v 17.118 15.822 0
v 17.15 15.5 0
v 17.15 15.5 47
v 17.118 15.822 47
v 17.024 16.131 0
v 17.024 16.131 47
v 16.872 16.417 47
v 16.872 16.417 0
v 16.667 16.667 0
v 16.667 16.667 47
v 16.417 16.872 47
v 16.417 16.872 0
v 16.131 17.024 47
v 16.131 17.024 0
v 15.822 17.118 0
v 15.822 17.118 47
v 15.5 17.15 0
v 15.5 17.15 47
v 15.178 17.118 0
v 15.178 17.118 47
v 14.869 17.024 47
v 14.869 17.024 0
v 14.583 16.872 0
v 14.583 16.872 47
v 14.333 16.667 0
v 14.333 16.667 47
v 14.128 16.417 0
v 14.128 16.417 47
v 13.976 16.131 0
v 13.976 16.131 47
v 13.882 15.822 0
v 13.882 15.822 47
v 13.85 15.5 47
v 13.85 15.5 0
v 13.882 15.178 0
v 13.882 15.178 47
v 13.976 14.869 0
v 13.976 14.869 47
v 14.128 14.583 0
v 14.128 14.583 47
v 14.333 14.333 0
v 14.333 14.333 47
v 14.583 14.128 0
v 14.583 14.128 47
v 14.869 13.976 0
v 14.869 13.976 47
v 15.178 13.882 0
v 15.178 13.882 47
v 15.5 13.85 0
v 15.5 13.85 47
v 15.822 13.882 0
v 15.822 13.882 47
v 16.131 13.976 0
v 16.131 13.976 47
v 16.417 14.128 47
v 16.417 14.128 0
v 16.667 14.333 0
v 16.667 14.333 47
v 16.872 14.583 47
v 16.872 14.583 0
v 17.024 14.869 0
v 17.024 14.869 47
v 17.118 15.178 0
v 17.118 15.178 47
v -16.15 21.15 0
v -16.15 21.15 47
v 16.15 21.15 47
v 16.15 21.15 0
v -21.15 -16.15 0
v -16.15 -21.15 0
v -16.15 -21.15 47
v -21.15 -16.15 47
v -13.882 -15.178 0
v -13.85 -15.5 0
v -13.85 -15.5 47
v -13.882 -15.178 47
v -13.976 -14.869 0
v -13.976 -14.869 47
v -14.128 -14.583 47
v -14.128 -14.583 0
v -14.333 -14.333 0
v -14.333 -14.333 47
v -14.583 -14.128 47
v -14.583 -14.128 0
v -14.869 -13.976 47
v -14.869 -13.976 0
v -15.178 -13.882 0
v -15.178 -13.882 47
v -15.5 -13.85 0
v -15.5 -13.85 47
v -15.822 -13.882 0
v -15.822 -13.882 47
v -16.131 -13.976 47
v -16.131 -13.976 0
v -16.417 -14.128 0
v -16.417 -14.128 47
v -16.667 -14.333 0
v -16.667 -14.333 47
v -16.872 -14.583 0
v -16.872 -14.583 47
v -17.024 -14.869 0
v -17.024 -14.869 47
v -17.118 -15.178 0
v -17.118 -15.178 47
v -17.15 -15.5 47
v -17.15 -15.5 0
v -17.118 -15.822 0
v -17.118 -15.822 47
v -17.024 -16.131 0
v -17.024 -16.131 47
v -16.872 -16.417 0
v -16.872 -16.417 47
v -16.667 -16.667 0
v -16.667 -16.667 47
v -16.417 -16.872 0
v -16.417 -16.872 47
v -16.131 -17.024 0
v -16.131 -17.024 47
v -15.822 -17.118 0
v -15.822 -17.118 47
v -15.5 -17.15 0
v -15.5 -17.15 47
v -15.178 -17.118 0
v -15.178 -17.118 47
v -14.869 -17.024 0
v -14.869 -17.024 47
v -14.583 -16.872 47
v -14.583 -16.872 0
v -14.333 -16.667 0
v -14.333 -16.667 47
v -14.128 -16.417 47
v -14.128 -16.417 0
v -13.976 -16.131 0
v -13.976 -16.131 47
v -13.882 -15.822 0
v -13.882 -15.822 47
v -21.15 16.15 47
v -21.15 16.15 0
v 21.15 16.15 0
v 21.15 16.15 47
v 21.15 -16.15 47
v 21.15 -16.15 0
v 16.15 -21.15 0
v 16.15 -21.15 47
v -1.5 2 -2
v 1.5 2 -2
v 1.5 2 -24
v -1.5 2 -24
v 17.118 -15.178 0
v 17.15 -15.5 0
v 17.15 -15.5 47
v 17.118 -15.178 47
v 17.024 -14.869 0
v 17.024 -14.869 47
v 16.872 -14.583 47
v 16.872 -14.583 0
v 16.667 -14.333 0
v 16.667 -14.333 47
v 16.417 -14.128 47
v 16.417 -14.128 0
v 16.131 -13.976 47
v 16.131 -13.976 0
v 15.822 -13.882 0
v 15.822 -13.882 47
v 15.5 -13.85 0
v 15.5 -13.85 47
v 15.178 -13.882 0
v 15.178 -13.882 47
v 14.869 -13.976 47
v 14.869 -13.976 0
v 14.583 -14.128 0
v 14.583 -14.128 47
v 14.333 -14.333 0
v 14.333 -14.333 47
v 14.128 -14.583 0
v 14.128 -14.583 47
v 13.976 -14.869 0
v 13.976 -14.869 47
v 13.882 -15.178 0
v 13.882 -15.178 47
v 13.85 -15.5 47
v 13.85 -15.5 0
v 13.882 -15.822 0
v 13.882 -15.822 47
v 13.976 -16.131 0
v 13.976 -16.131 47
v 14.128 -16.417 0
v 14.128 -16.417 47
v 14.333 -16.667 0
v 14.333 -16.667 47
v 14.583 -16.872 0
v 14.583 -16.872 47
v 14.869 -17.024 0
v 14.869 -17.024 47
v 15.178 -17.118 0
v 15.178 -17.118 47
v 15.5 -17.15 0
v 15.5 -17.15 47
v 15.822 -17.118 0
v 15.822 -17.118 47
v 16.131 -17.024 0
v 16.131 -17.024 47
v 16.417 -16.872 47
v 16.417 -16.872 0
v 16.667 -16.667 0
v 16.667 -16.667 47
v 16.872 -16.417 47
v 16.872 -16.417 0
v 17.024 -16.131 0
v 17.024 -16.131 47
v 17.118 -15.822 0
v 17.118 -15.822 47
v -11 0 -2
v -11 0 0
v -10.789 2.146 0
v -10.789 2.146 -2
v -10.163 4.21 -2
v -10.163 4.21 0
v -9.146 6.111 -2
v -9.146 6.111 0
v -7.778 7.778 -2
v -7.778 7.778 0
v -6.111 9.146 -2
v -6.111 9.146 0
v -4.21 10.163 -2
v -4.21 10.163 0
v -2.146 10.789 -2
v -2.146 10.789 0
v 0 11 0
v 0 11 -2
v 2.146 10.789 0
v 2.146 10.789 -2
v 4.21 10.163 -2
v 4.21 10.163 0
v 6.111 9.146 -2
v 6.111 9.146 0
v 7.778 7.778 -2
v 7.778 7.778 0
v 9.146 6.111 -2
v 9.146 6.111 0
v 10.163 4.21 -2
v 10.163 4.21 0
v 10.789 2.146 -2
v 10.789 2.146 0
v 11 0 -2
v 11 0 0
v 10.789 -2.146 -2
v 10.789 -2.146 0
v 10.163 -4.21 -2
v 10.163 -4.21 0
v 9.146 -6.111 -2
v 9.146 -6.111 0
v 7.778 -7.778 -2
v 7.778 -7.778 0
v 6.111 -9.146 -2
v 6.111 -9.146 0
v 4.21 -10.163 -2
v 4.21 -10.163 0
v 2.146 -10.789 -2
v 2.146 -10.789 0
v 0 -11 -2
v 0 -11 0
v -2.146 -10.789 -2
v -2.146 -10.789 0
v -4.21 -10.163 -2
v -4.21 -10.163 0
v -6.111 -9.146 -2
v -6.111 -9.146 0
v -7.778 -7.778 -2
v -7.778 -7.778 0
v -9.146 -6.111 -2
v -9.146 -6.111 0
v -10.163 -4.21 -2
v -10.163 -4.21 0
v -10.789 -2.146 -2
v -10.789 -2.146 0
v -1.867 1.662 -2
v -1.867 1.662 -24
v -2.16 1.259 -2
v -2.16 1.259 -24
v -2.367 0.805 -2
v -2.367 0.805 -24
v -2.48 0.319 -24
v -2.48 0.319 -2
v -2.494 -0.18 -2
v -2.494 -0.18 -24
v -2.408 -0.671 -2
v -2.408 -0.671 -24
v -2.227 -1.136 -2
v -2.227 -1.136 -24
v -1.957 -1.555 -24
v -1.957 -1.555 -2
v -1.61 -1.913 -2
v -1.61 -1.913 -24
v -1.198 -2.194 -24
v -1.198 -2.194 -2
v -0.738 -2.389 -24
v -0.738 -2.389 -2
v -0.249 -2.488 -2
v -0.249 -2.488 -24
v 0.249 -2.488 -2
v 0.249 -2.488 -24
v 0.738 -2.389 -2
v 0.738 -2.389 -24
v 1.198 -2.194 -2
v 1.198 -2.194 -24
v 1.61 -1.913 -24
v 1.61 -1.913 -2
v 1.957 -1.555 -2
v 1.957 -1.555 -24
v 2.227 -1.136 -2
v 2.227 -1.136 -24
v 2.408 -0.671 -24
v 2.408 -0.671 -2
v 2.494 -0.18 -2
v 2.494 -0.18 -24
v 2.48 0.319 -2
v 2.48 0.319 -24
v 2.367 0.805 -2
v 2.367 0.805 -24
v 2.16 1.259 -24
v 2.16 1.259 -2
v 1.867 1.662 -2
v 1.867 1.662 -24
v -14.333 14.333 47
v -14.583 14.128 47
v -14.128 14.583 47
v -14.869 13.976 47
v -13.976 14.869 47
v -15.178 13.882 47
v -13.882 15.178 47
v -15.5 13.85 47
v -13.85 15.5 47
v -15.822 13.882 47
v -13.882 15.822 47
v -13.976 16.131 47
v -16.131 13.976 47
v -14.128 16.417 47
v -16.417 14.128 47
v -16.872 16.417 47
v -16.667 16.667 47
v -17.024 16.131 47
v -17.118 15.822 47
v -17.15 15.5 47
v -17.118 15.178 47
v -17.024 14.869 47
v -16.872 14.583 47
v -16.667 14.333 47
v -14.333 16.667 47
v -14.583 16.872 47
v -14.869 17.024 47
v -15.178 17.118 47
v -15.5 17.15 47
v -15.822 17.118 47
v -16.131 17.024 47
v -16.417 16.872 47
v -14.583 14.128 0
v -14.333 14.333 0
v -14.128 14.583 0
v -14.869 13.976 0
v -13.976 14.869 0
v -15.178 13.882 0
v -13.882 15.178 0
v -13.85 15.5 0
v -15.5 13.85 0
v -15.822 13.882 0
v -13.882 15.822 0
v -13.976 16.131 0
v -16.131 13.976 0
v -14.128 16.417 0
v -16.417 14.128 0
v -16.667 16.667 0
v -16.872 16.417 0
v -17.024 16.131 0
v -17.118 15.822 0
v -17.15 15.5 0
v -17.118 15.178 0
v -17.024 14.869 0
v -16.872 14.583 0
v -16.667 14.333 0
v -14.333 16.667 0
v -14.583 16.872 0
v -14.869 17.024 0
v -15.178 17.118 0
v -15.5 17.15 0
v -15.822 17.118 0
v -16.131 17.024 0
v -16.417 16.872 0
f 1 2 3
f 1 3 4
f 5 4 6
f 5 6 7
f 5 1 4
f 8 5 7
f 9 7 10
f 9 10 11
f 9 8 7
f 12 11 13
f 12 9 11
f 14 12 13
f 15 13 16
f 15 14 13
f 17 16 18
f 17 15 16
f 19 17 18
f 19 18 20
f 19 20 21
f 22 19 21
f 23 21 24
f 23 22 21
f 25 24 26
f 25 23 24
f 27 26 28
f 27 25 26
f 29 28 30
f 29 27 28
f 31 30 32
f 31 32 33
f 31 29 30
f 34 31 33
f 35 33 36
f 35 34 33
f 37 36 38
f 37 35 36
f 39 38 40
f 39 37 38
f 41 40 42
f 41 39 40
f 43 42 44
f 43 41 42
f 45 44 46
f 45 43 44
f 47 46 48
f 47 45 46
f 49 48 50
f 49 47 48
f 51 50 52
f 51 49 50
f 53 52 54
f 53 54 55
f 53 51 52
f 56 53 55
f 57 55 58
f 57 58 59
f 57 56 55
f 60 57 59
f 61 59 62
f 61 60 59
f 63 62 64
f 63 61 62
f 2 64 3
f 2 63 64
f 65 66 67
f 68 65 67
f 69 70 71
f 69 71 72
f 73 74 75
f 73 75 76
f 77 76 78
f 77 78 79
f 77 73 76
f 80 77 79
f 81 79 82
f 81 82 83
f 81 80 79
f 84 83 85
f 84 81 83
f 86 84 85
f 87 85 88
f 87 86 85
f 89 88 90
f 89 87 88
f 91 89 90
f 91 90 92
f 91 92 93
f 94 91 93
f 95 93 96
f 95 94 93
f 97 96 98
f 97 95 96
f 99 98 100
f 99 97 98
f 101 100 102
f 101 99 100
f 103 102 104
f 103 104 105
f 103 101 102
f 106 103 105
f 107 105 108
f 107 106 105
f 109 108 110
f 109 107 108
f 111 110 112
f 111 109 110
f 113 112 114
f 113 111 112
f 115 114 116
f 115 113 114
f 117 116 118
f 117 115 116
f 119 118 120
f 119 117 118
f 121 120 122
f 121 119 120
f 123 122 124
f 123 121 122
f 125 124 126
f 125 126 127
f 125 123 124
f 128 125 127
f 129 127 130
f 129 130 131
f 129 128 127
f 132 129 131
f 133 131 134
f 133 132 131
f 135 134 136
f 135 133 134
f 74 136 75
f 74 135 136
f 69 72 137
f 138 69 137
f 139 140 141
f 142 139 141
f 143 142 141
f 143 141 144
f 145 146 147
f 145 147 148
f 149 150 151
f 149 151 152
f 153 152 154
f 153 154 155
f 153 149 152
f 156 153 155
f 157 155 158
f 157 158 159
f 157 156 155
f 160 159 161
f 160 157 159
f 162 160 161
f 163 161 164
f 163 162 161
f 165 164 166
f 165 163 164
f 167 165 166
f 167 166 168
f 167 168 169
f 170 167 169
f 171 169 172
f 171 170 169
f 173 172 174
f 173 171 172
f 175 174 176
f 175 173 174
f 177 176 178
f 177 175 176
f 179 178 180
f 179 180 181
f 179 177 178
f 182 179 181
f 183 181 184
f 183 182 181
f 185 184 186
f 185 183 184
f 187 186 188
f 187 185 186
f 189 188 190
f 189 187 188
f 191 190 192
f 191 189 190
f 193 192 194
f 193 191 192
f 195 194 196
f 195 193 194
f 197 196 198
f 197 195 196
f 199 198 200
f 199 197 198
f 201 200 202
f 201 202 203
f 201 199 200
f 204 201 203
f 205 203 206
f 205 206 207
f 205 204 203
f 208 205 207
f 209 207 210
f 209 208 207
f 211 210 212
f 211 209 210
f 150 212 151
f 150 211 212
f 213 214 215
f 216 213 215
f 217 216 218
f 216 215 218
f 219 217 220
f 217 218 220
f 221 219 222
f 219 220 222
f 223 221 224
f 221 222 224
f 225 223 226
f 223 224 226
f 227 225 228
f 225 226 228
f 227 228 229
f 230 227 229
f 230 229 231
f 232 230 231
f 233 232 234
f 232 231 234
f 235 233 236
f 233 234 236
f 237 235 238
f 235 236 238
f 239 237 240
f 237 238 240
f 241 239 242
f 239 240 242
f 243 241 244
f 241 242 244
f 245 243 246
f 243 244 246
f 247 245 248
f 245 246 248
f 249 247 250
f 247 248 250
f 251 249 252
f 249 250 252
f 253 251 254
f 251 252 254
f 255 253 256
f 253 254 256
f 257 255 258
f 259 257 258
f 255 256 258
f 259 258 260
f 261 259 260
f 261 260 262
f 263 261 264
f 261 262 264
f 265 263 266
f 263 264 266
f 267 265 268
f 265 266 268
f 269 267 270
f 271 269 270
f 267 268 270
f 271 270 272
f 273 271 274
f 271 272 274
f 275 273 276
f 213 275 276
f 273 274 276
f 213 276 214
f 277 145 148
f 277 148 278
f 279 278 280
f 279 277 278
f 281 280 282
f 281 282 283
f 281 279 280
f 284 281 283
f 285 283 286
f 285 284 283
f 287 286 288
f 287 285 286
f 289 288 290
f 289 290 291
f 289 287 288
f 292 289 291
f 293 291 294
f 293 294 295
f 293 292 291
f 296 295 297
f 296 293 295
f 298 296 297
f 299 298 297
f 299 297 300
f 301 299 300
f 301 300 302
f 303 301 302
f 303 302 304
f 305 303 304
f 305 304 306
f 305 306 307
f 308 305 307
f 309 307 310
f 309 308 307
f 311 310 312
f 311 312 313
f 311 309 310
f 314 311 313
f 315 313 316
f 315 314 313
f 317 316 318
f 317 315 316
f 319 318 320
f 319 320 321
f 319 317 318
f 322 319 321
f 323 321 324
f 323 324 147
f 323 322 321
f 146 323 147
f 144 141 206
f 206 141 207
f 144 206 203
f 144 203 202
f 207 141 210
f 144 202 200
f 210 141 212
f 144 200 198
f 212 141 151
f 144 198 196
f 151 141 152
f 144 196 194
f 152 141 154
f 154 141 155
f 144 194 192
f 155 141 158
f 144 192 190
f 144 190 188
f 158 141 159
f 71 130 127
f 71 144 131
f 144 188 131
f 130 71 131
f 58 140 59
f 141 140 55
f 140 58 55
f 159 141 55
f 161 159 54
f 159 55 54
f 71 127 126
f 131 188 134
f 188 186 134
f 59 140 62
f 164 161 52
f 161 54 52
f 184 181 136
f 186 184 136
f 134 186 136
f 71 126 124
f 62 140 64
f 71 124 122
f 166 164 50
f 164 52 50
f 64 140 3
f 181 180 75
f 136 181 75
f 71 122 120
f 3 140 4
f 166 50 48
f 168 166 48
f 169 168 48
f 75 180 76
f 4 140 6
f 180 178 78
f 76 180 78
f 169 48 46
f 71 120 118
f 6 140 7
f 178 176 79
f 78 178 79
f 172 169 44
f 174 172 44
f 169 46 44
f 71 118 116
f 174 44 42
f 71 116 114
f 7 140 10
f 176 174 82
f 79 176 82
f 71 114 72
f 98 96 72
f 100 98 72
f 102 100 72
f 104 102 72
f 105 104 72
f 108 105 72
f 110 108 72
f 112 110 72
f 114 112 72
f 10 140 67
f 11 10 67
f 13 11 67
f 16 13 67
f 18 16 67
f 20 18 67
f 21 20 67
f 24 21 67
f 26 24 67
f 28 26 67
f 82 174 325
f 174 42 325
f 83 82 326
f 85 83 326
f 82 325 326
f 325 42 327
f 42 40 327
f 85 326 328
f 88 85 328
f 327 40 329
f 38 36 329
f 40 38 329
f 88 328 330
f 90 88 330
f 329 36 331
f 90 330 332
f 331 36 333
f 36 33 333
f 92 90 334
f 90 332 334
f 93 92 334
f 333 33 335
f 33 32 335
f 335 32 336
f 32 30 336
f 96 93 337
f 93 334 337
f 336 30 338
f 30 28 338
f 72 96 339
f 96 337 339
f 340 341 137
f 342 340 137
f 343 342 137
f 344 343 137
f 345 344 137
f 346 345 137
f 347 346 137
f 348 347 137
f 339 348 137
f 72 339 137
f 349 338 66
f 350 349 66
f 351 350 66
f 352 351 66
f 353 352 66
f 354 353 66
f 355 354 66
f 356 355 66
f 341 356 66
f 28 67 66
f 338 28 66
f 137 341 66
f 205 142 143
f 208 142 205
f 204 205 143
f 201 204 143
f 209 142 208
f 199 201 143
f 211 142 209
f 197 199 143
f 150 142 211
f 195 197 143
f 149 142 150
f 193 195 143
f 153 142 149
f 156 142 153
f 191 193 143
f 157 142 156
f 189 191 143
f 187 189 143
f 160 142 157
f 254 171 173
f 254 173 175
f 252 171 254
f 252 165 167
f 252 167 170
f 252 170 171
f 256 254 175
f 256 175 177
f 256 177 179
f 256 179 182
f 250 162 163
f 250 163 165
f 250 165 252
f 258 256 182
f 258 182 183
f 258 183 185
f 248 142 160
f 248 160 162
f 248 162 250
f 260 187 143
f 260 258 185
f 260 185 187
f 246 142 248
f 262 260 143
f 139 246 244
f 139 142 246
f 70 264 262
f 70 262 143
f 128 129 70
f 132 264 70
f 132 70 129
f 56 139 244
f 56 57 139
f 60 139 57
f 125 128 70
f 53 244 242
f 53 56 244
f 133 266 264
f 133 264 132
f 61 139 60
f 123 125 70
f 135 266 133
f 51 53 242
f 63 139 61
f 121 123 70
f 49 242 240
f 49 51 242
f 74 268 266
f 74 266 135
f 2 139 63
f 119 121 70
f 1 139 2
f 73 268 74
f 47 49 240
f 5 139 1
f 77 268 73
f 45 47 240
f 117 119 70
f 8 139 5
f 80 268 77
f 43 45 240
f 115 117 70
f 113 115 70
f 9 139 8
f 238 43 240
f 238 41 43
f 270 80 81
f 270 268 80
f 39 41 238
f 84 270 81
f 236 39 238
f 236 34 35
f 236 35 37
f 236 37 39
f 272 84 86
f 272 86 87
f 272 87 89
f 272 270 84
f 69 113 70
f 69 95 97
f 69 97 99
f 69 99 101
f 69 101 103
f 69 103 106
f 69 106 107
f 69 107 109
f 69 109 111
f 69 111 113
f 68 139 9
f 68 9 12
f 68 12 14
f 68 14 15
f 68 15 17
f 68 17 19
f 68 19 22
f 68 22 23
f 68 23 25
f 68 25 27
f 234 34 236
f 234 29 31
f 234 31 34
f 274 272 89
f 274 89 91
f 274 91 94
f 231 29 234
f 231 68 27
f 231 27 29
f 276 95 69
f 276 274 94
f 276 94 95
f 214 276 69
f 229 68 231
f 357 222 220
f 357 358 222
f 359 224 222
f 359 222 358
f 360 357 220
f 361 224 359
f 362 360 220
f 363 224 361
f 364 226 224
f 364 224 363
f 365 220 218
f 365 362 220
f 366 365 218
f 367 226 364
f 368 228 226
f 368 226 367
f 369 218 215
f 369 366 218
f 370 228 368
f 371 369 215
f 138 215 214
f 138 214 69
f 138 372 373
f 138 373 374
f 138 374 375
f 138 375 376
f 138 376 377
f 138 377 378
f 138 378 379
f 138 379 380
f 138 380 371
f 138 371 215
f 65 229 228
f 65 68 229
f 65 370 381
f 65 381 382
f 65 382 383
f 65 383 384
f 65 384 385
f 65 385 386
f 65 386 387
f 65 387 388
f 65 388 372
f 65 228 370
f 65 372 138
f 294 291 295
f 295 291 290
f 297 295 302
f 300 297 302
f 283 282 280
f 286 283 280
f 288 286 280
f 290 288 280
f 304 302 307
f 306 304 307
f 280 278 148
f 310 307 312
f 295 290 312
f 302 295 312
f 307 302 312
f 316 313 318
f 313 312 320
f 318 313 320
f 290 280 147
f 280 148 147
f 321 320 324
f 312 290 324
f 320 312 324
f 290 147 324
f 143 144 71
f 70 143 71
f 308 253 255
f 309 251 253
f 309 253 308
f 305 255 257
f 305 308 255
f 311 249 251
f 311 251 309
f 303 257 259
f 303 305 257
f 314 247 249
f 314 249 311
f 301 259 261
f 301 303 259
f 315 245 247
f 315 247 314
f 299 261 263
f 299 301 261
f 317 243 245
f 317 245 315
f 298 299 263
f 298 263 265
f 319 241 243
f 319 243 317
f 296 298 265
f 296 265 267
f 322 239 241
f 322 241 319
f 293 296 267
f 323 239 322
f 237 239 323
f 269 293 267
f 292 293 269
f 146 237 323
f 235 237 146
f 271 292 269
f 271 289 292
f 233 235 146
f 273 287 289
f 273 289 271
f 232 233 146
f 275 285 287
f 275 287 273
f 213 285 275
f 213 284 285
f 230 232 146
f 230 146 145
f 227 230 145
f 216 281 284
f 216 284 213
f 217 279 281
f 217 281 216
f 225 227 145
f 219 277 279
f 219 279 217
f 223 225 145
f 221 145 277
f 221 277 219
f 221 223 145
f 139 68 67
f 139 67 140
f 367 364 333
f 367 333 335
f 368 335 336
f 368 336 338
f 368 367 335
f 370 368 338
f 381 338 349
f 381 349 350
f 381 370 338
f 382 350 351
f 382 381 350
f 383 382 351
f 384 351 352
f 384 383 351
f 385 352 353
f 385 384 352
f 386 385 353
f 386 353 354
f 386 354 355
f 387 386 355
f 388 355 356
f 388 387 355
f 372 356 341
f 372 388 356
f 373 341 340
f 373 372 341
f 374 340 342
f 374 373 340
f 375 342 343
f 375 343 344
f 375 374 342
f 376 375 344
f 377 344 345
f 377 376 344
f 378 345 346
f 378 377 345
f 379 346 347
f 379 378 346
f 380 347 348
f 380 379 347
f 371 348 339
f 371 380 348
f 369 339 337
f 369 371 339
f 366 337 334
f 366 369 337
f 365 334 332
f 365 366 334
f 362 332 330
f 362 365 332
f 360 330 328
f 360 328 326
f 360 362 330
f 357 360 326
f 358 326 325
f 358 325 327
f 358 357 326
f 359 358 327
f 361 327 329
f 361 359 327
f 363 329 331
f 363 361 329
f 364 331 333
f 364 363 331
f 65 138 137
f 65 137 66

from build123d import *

# Parameters (mm, degrees)
SKETCH_1_R      = 1.65
EXTRUDE_1_DEPTH = 47
SKETCH_3_R      = 11
EXTRUDE_2_DEPTH = 2
EXTRUDE_3_DEPTH = 22


with BuildPart() as part:
    # 草图1 → 凸台-拉伸1 (new body)
    with BuildSketch(Plane.XY):
        Polygon((-21.15, 16.15), (-16.15, 21.15), (16.15, 21.15), (21.15, 16.15), (21.15, -16.15), (16.15, -21.15), (-16.15, -21.15), (-21.15, -16.15), align=None)
        with Locations((15.5, 15.5)):
            Circle(SKETCH_1_R, mode=Mode.SUBTRACT)
        with Locations((-15.5, 15.5)):
            Circle(SKETCH_1_R, mode=Mode.SUBTRACT)
        with Locations((15.5, -15.5)):
            Circle(SKETCH_1_R, mode=Mode.SUBTRACT)
        with Locations((-15.5, -15.5)):
            Circle(SKETCH_1_R, mode=Mode.SUBTRACT)
    extrude(amount=EXTRUDE_1_DEPTH)

    # 草图3 → 凸台-拉伸2 (add)
    with BuildSketch(Plane(origin=(0, 0, 0), x_dir=(-1, 0, 0), z_dir=(0, 0, -1))):
        Circle(SKETCH_3_R)
    extrude(amount=EXTRUDE_2_DEPTH)

    # 草图4 → 凸台-拉伸3 (add)
    with BuildSketch(Plane(origin=(0, 0, -2), x_dir=(-1, 0, 0), z_dir=(0, 0, -1))):
        with BuildLine():
            Line((-1.5, 2), (1.5, 2))
            ThreePointArc((1.5, 2), (0, -2.5), (-1.5, 2))
        make_face()
    extrude(amount=EXTRUDE_3_DEPTH)


solid = part.part
